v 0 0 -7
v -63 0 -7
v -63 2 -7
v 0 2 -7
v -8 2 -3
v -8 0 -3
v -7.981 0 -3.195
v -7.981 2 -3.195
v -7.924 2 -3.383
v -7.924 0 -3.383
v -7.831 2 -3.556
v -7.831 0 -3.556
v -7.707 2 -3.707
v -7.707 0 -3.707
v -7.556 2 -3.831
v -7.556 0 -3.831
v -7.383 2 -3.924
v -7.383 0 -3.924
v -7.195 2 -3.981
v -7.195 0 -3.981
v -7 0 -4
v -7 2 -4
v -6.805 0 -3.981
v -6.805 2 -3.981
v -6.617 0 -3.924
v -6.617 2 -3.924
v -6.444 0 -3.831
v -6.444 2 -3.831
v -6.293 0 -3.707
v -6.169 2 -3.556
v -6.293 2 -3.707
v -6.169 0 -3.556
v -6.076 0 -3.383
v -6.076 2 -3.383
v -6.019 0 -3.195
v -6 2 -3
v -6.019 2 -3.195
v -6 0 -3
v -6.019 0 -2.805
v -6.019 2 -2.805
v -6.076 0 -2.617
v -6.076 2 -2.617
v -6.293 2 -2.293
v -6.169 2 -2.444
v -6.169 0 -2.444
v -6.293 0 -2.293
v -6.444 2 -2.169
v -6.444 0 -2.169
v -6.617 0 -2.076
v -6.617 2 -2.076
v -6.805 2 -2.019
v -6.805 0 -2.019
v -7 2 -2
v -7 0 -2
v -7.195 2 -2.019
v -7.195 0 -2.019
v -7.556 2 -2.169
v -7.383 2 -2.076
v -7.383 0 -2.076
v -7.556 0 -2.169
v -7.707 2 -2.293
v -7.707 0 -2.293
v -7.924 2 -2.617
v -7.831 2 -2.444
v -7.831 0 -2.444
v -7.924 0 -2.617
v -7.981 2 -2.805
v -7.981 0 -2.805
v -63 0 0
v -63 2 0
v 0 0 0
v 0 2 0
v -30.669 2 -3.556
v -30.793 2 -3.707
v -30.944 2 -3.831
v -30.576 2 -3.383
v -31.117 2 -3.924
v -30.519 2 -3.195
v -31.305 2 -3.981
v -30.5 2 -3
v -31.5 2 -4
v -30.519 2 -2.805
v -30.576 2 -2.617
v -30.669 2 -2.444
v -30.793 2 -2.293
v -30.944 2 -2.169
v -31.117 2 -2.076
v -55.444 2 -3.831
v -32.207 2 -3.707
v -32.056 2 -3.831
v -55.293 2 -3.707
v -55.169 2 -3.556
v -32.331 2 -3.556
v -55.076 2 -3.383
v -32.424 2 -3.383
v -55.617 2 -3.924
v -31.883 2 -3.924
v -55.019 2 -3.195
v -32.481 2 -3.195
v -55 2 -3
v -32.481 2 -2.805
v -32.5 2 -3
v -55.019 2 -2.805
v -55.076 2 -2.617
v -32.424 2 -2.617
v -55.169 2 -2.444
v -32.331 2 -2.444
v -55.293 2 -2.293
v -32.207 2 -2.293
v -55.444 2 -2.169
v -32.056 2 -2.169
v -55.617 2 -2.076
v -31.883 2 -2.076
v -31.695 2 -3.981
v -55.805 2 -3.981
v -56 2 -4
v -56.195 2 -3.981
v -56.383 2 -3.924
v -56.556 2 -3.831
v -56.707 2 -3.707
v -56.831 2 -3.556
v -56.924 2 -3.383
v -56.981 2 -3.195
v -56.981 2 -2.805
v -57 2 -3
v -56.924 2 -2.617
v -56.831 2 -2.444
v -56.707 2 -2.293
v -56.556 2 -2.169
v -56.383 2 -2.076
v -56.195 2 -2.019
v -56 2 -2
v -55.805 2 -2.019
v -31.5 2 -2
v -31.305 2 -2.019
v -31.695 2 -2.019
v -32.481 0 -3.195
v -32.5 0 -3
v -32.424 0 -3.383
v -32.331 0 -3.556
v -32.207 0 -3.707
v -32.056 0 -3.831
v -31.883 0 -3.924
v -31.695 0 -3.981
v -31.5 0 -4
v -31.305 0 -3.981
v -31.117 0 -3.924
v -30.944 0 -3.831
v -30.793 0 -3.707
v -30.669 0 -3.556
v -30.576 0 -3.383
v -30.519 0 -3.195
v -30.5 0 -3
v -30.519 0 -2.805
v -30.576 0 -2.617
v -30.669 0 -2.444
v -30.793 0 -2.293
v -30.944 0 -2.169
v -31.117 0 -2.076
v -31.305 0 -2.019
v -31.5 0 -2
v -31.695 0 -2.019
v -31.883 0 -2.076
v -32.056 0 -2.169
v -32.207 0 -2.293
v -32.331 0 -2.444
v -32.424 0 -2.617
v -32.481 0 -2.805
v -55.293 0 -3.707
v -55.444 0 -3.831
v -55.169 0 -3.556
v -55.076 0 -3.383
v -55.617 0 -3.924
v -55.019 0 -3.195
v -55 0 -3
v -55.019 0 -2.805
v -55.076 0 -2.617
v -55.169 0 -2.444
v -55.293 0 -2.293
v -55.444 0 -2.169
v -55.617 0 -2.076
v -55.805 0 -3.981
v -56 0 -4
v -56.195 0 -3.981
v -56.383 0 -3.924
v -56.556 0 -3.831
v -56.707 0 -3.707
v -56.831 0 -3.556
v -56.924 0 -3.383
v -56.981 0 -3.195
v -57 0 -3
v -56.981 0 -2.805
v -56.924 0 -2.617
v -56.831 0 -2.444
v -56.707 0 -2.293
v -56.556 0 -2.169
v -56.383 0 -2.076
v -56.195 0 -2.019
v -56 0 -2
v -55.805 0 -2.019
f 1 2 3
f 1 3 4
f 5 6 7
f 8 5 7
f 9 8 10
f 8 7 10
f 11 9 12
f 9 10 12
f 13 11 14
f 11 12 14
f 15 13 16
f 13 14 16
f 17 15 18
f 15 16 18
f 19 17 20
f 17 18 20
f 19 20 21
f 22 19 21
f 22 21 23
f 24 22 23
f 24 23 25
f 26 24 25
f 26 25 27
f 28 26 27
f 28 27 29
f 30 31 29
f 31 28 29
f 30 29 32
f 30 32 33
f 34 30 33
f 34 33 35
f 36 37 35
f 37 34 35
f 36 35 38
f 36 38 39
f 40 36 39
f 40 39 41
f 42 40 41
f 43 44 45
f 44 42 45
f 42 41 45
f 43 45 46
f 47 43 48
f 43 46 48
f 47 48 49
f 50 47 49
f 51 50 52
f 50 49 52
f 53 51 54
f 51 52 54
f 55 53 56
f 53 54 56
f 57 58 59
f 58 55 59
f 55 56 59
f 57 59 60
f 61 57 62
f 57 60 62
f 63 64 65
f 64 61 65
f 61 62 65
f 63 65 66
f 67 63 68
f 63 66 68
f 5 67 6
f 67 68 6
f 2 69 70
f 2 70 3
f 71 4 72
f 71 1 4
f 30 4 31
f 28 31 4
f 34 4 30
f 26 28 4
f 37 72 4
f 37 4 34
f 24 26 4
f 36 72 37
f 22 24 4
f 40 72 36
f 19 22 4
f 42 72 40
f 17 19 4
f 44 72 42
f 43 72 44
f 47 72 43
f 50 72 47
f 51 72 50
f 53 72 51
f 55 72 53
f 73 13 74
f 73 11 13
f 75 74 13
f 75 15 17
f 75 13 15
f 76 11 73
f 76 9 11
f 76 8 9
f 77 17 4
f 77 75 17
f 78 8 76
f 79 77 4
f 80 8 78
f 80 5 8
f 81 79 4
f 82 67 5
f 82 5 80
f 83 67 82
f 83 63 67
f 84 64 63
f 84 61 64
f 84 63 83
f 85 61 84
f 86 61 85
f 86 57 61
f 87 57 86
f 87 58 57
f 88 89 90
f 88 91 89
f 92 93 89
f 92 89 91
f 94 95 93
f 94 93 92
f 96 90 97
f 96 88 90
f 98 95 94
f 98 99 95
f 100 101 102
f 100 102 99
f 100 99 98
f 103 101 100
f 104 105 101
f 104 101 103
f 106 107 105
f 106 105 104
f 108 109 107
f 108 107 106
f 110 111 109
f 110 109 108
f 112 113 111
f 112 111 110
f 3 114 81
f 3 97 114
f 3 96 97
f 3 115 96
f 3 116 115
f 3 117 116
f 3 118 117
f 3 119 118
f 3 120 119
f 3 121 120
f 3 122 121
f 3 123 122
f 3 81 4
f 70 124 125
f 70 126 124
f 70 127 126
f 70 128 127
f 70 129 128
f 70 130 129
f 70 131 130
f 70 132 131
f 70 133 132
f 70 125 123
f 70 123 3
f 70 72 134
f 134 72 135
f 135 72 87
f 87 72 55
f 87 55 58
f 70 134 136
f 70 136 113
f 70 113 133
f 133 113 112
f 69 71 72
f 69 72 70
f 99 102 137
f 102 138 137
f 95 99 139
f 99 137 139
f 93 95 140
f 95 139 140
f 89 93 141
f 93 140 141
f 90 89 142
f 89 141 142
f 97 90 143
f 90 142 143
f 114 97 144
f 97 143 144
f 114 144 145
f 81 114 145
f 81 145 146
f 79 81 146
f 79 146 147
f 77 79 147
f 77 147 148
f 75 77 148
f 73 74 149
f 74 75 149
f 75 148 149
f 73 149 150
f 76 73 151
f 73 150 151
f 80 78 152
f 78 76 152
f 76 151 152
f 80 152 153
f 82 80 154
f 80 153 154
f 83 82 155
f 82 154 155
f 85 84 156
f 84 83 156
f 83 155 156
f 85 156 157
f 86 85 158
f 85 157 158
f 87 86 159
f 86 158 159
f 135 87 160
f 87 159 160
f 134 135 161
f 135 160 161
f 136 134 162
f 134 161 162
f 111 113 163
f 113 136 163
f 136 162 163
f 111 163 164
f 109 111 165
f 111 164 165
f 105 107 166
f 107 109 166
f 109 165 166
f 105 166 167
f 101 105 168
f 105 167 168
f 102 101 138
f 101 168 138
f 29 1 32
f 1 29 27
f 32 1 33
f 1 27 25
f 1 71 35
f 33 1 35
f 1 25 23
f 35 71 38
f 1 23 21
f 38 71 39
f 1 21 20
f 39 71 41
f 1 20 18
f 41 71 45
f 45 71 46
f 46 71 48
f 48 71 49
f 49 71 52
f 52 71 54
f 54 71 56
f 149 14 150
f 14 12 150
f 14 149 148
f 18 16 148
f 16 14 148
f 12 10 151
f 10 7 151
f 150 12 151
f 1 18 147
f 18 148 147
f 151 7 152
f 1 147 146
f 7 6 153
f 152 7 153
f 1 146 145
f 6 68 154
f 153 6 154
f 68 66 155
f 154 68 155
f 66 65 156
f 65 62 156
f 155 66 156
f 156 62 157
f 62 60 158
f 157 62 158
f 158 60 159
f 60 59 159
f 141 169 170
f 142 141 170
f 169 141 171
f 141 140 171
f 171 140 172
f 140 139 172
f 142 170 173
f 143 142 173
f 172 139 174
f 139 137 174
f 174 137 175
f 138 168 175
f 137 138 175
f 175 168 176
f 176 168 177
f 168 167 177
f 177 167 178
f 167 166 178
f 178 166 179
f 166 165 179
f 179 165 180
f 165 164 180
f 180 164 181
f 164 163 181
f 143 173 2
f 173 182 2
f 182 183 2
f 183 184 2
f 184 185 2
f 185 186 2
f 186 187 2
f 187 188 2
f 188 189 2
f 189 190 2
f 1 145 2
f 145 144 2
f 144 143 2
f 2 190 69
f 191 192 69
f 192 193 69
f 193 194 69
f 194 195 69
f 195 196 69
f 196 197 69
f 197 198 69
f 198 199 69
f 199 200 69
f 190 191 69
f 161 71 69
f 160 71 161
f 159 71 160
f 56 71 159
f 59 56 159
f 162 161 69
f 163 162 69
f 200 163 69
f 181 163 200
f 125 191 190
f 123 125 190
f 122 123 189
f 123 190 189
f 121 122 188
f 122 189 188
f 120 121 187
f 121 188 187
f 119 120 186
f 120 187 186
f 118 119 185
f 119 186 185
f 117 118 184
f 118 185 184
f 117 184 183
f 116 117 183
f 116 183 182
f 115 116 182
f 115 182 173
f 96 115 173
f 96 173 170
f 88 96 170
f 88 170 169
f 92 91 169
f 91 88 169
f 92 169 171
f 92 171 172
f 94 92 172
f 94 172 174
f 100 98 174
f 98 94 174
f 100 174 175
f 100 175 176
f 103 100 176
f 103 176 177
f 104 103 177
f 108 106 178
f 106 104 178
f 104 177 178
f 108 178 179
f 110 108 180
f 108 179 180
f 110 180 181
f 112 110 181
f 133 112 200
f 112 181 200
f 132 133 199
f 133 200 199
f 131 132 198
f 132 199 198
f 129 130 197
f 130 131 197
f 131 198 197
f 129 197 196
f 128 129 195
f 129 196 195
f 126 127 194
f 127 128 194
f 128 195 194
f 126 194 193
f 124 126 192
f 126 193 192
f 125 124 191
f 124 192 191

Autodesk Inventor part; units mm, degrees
ref_plane "YZ Plane" through (0, 0, 0) normal (1, 0, 0) x (0, 1, 0)
ref_plane "XZ Plane" through (0, 0, 0) normal (0, 1, 0) x (-1, 0, 0)
ref_plane "XY Plane" through (0, 0, 0) normal (0, 0, 1) x (1, 0, 0)
sketch "Sketch1" plane through (0, 0, 0) normal (0, 1, 0) x (-1, 0, 0)
  line L0 (0, 0) -> (63, 0)
  line L1 (63, 0) -> (63, -7)
  line L2 (63, -7) -> (0, -7)
  line L3 (0, -7) -> (0, 0)
  circle A0 centre (31.5, -3) radius 1
  line L4 (31.5, 0) -> (31.5, -6) construction
  circle A1 centre (7, -3) radius 1
  circle A2 centre (56, -3) radius 1
  line L5 (63, -3) -> (0, -3) construction
  dimension "d0" = 63
  dimension "d1" = 7
  dimension "d2" = 2
  dimension "d3" = 31.5
  dimension "d5" = 7
  dimension "d6" = 2
  dimension "d9" = 3
extrude "Extrusion1" add sketch "Sketch1" along normal blind 2
equation "\"d3\" = 0.5 * d0"
equation "\"d6\" = d2"
properties part number "Seal"
